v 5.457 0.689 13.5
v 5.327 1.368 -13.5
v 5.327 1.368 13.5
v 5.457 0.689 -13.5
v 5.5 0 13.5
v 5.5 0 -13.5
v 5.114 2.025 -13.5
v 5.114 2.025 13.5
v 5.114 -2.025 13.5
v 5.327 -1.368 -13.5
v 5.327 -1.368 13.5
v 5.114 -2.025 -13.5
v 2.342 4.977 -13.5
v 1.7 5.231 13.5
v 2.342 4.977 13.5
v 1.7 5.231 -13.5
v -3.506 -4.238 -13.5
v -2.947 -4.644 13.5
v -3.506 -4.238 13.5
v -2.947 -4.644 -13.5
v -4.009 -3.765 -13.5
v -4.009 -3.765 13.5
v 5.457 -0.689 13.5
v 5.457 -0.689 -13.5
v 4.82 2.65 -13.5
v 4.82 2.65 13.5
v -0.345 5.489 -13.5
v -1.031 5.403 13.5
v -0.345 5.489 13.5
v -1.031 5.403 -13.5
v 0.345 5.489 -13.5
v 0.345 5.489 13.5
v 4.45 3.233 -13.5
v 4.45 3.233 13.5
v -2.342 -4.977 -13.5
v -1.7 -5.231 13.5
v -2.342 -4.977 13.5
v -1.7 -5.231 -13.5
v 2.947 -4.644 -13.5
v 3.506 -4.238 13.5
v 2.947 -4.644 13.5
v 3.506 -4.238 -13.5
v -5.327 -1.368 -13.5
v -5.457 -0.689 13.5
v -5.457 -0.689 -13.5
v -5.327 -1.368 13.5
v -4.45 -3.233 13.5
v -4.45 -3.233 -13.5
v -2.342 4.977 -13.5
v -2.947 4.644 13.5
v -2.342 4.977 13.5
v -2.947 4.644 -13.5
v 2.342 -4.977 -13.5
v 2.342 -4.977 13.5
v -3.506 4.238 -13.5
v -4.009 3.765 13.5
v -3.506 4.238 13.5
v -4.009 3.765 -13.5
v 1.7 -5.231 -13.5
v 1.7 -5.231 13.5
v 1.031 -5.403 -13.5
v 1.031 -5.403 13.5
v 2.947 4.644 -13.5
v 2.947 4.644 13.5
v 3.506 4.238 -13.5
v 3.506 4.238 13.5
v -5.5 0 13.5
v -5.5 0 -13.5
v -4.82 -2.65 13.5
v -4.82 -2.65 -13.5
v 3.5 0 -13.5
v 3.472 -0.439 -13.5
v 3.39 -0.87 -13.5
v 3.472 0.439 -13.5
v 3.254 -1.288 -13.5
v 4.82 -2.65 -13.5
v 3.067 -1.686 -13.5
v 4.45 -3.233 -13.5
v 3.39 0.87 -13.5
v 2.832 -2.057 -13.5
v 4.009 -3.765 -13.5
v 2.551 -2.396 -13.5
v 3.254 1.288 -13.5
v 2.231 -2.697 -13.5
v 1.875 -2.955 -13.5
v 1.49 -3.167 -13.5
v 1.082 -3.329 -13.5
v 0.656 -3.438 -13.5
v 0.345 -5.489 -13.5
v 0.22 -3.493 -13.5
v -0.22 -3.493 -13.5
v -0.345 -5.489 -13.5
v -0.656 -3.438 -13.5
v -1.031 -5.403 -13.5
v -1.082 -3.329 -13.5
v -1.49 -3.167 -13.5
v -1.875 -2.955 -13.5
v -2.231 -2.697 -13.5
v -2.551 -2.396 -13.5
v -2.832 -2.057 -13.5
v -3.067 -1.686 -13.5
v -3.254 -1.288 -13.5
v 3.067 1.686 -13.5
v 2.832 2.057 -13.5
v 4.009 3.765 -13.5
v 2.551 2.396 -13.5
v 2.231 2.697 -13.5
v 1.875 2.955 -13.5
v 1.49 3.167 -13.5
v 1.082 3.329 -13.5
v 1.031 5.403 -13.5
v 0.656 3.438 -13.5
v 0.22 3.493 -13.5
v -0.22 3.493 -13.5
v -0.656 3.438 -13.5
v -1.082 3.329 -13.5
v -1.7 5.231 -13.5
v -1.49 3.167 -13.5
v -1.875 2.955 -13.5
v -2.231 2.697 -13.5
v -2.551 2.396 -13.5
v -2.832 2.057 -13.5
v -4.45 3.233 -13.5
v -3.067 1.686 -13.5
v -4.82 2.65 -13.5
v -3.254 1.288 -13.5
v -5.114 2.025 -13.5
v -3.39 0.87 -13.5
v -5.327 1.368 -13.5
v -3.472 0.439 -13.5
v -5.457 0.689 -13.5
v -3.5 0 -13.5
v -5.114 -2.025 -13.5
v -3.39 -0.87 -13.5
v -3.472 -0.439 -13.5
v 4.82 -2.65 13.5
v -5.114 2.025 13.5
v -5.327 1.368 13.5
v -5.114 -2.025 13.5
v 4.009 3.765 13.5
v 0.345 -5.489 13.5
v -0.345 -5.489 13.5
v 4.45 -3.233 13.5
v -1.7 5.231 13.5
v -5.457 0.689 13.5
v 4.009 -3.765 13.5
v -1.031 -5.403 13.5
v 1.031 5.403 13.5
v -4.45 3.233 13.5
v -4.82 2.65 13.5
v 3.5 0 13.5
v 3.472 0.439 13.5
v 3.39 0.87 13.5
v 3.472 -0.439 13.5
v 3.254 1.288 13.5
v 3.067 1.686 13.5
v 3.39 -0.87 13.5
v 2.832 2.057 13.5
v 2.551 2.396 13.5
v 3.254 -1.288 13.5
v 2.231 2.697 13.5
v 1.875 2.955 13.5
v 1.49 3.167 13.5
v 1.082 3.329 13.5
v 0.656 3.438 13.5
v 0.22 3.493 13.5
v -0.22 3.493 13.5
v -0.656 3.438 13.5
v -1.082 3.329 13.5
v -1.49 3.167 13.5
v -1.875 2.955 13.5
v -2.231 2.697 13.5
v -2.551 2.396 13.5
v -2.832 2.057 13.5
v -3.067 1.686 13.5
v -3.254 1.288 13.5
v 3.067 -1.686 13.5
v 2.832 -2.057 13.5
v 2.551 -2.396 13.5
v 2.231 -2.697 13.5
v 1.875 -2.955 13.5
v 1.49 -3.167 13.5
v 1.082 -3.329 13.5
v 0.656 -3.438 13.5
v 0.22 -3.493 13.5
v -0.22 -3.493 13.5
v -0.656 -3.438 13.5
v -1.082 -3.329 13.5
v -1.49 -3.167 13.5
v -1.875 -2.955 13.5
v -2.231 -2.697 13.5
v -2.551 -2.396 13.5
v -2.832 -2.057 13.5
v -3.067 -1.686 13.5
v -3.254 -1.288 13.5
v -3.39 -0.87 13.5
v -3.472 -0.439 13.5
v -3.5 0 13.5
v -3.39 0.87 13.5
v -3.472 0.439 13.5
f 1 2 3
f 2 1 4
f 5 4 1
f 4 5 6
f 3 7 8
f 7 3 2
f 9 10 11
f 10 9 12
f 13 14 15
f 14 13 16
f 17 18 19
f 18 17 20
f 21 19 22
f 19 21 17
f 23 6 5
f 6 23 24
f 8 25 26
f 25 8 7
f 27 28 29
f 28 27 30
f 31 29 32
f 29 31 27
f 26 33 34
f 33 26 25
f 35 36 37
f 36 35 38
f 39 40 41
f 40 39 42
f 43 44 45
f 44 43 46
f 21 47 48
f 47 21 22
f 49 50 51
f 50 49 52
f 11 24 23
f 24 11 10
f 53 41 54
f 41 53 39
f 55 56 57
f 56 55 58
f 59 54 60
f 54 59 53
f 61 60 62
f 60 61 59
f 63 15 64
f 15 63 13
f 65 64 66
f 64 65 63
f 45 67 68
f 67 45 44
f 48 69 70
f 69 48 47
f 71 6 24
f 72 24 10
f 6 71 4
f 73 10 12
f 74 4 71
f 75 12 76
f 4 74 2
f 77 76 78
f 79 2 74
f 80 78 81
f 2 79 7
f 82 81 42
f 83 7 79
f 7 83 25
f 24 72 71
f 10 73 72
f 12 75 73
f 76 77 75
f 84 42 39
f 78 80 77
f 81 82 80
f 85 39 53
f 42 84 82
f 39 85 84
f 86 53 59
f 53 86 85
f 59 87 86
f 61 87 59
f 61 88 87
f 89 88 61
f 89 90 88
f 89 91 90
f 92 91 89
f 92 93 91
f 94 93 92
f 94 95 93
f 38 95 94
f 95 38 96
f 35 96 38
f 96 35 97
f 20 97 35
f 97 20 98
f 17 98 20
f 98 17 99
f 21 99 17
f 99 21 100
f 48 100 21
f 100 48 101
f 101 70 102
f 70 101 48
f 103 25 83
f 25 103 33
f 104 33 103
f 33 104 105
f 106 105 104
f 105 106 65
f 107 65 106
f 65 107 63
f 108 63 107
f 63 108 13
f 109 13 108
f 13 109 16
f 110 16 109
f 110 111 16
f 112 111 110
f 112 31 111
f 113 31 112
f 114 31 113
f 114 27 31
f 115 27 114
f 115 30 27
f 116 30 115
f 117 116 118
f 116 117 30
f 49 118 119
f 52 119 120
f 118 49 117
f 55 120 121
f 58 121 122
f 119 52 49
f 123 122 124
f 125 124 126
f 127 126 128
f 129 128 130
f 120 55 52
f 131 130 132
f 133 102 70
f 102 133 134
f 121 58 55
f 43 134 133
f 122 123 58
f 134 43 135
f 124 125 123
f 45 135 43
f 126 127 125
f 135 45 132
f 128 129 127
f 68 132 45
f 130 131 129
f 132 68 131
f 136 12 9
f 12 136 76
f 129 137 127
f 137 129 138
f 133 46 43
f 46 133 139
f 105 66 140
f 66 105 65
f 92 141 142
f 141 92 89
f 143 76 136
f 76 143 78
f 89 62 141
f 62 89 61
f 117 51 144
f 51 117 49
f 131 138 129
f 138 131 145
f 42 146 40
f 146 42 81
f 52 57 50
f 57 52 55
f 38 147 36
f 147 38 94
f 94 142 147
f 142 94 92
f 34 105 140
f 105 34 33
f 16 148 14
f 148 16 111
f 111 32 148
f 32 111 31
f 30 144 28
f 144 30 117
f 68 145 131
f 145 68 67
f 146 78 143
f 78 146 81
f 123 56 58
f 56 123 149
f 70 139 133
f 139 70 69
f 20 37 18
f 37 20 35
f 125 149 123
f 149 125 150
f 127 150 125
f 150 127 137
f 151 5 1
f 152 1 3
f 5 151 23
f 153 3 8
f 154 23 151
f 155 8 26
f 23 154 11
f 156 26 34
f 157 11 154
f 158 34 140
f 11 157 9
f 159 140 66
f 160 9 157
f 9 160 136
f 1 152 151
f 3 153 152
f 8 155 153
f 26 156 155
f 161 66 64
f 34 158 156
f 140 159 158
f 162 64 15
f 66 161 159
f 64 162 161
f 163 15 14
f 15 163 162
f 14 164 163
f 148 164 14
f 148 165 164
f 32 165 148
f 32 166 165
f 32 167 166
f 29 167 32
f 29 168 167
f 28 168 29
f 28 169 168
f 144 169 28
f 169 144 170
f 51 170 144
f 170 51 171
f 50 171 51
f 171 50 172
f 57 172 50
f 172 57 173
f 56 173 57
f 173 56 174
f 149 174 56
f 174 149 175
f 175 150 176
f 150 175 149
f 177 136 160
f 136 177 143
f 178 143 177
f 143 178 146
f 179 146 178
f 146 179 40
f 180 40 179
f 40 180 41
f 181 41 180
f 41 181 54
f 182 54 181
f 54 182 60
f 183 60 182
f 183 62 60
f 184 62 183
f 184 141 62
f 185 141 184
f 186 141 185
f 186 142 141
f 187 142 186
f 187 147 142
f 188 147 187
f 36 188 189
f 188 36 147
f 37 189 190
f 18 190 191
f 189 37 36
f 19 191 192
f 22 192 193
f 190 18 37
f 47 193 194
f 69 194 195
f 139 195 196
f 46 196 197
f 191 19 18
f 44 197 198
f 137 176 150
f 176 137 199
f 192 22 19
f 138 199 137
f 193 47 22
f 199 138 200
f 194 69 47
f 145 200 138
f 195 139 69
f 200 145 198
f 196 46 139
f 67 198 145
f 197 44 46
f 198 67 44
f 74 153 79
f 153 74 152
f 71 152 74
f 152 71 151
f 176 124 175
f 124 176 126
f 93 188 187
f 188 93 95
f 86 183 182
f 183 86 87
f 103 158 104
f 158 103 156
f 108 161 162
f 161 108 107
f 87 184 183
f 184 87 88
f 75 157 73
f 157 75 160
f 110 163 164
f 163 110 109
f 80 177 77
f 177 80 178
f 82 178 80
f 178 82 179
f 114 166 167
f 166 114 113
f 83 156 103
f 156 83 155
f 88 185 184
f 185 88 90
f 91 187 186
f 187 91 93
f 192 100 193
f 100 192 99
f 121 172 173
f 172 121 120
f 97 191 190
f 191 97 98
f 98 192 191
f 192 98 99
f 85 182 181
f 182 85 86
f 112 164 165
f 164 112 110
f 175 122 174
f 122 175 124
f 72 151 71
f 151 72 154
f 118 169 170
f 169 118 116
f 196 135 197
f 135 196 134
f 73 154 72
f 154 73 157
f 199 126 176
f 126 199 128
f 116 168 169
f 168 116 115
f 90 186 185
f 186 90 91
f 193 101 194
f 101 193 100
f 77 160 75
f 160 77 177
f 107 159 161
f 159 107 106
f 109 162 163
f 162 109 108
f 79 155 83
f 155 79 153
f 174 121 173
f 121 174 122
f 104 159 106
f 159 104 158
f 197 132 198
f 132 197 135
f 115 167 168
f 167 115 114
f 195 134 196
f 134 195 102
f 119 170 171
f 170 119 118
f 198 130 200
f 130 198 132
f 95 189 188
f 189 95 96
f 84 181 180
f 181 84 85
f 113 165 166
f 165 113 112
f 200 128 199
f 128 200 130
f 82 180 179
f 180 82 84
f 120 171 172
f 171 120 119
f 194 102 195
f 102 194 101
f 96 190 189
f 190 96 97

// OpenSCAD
$fn = 50;


difference() {
	union() {
		translate(v = [0, 0, -13.5000000000]) {
			cylinder(h = 27, r = 5.5000000000);
		}
	}
	union() {
		translate(v = [0, 0, -100.0000000000]) {
			cylinder(h = 200, r = 3.5000000000);
		}
	}
}
